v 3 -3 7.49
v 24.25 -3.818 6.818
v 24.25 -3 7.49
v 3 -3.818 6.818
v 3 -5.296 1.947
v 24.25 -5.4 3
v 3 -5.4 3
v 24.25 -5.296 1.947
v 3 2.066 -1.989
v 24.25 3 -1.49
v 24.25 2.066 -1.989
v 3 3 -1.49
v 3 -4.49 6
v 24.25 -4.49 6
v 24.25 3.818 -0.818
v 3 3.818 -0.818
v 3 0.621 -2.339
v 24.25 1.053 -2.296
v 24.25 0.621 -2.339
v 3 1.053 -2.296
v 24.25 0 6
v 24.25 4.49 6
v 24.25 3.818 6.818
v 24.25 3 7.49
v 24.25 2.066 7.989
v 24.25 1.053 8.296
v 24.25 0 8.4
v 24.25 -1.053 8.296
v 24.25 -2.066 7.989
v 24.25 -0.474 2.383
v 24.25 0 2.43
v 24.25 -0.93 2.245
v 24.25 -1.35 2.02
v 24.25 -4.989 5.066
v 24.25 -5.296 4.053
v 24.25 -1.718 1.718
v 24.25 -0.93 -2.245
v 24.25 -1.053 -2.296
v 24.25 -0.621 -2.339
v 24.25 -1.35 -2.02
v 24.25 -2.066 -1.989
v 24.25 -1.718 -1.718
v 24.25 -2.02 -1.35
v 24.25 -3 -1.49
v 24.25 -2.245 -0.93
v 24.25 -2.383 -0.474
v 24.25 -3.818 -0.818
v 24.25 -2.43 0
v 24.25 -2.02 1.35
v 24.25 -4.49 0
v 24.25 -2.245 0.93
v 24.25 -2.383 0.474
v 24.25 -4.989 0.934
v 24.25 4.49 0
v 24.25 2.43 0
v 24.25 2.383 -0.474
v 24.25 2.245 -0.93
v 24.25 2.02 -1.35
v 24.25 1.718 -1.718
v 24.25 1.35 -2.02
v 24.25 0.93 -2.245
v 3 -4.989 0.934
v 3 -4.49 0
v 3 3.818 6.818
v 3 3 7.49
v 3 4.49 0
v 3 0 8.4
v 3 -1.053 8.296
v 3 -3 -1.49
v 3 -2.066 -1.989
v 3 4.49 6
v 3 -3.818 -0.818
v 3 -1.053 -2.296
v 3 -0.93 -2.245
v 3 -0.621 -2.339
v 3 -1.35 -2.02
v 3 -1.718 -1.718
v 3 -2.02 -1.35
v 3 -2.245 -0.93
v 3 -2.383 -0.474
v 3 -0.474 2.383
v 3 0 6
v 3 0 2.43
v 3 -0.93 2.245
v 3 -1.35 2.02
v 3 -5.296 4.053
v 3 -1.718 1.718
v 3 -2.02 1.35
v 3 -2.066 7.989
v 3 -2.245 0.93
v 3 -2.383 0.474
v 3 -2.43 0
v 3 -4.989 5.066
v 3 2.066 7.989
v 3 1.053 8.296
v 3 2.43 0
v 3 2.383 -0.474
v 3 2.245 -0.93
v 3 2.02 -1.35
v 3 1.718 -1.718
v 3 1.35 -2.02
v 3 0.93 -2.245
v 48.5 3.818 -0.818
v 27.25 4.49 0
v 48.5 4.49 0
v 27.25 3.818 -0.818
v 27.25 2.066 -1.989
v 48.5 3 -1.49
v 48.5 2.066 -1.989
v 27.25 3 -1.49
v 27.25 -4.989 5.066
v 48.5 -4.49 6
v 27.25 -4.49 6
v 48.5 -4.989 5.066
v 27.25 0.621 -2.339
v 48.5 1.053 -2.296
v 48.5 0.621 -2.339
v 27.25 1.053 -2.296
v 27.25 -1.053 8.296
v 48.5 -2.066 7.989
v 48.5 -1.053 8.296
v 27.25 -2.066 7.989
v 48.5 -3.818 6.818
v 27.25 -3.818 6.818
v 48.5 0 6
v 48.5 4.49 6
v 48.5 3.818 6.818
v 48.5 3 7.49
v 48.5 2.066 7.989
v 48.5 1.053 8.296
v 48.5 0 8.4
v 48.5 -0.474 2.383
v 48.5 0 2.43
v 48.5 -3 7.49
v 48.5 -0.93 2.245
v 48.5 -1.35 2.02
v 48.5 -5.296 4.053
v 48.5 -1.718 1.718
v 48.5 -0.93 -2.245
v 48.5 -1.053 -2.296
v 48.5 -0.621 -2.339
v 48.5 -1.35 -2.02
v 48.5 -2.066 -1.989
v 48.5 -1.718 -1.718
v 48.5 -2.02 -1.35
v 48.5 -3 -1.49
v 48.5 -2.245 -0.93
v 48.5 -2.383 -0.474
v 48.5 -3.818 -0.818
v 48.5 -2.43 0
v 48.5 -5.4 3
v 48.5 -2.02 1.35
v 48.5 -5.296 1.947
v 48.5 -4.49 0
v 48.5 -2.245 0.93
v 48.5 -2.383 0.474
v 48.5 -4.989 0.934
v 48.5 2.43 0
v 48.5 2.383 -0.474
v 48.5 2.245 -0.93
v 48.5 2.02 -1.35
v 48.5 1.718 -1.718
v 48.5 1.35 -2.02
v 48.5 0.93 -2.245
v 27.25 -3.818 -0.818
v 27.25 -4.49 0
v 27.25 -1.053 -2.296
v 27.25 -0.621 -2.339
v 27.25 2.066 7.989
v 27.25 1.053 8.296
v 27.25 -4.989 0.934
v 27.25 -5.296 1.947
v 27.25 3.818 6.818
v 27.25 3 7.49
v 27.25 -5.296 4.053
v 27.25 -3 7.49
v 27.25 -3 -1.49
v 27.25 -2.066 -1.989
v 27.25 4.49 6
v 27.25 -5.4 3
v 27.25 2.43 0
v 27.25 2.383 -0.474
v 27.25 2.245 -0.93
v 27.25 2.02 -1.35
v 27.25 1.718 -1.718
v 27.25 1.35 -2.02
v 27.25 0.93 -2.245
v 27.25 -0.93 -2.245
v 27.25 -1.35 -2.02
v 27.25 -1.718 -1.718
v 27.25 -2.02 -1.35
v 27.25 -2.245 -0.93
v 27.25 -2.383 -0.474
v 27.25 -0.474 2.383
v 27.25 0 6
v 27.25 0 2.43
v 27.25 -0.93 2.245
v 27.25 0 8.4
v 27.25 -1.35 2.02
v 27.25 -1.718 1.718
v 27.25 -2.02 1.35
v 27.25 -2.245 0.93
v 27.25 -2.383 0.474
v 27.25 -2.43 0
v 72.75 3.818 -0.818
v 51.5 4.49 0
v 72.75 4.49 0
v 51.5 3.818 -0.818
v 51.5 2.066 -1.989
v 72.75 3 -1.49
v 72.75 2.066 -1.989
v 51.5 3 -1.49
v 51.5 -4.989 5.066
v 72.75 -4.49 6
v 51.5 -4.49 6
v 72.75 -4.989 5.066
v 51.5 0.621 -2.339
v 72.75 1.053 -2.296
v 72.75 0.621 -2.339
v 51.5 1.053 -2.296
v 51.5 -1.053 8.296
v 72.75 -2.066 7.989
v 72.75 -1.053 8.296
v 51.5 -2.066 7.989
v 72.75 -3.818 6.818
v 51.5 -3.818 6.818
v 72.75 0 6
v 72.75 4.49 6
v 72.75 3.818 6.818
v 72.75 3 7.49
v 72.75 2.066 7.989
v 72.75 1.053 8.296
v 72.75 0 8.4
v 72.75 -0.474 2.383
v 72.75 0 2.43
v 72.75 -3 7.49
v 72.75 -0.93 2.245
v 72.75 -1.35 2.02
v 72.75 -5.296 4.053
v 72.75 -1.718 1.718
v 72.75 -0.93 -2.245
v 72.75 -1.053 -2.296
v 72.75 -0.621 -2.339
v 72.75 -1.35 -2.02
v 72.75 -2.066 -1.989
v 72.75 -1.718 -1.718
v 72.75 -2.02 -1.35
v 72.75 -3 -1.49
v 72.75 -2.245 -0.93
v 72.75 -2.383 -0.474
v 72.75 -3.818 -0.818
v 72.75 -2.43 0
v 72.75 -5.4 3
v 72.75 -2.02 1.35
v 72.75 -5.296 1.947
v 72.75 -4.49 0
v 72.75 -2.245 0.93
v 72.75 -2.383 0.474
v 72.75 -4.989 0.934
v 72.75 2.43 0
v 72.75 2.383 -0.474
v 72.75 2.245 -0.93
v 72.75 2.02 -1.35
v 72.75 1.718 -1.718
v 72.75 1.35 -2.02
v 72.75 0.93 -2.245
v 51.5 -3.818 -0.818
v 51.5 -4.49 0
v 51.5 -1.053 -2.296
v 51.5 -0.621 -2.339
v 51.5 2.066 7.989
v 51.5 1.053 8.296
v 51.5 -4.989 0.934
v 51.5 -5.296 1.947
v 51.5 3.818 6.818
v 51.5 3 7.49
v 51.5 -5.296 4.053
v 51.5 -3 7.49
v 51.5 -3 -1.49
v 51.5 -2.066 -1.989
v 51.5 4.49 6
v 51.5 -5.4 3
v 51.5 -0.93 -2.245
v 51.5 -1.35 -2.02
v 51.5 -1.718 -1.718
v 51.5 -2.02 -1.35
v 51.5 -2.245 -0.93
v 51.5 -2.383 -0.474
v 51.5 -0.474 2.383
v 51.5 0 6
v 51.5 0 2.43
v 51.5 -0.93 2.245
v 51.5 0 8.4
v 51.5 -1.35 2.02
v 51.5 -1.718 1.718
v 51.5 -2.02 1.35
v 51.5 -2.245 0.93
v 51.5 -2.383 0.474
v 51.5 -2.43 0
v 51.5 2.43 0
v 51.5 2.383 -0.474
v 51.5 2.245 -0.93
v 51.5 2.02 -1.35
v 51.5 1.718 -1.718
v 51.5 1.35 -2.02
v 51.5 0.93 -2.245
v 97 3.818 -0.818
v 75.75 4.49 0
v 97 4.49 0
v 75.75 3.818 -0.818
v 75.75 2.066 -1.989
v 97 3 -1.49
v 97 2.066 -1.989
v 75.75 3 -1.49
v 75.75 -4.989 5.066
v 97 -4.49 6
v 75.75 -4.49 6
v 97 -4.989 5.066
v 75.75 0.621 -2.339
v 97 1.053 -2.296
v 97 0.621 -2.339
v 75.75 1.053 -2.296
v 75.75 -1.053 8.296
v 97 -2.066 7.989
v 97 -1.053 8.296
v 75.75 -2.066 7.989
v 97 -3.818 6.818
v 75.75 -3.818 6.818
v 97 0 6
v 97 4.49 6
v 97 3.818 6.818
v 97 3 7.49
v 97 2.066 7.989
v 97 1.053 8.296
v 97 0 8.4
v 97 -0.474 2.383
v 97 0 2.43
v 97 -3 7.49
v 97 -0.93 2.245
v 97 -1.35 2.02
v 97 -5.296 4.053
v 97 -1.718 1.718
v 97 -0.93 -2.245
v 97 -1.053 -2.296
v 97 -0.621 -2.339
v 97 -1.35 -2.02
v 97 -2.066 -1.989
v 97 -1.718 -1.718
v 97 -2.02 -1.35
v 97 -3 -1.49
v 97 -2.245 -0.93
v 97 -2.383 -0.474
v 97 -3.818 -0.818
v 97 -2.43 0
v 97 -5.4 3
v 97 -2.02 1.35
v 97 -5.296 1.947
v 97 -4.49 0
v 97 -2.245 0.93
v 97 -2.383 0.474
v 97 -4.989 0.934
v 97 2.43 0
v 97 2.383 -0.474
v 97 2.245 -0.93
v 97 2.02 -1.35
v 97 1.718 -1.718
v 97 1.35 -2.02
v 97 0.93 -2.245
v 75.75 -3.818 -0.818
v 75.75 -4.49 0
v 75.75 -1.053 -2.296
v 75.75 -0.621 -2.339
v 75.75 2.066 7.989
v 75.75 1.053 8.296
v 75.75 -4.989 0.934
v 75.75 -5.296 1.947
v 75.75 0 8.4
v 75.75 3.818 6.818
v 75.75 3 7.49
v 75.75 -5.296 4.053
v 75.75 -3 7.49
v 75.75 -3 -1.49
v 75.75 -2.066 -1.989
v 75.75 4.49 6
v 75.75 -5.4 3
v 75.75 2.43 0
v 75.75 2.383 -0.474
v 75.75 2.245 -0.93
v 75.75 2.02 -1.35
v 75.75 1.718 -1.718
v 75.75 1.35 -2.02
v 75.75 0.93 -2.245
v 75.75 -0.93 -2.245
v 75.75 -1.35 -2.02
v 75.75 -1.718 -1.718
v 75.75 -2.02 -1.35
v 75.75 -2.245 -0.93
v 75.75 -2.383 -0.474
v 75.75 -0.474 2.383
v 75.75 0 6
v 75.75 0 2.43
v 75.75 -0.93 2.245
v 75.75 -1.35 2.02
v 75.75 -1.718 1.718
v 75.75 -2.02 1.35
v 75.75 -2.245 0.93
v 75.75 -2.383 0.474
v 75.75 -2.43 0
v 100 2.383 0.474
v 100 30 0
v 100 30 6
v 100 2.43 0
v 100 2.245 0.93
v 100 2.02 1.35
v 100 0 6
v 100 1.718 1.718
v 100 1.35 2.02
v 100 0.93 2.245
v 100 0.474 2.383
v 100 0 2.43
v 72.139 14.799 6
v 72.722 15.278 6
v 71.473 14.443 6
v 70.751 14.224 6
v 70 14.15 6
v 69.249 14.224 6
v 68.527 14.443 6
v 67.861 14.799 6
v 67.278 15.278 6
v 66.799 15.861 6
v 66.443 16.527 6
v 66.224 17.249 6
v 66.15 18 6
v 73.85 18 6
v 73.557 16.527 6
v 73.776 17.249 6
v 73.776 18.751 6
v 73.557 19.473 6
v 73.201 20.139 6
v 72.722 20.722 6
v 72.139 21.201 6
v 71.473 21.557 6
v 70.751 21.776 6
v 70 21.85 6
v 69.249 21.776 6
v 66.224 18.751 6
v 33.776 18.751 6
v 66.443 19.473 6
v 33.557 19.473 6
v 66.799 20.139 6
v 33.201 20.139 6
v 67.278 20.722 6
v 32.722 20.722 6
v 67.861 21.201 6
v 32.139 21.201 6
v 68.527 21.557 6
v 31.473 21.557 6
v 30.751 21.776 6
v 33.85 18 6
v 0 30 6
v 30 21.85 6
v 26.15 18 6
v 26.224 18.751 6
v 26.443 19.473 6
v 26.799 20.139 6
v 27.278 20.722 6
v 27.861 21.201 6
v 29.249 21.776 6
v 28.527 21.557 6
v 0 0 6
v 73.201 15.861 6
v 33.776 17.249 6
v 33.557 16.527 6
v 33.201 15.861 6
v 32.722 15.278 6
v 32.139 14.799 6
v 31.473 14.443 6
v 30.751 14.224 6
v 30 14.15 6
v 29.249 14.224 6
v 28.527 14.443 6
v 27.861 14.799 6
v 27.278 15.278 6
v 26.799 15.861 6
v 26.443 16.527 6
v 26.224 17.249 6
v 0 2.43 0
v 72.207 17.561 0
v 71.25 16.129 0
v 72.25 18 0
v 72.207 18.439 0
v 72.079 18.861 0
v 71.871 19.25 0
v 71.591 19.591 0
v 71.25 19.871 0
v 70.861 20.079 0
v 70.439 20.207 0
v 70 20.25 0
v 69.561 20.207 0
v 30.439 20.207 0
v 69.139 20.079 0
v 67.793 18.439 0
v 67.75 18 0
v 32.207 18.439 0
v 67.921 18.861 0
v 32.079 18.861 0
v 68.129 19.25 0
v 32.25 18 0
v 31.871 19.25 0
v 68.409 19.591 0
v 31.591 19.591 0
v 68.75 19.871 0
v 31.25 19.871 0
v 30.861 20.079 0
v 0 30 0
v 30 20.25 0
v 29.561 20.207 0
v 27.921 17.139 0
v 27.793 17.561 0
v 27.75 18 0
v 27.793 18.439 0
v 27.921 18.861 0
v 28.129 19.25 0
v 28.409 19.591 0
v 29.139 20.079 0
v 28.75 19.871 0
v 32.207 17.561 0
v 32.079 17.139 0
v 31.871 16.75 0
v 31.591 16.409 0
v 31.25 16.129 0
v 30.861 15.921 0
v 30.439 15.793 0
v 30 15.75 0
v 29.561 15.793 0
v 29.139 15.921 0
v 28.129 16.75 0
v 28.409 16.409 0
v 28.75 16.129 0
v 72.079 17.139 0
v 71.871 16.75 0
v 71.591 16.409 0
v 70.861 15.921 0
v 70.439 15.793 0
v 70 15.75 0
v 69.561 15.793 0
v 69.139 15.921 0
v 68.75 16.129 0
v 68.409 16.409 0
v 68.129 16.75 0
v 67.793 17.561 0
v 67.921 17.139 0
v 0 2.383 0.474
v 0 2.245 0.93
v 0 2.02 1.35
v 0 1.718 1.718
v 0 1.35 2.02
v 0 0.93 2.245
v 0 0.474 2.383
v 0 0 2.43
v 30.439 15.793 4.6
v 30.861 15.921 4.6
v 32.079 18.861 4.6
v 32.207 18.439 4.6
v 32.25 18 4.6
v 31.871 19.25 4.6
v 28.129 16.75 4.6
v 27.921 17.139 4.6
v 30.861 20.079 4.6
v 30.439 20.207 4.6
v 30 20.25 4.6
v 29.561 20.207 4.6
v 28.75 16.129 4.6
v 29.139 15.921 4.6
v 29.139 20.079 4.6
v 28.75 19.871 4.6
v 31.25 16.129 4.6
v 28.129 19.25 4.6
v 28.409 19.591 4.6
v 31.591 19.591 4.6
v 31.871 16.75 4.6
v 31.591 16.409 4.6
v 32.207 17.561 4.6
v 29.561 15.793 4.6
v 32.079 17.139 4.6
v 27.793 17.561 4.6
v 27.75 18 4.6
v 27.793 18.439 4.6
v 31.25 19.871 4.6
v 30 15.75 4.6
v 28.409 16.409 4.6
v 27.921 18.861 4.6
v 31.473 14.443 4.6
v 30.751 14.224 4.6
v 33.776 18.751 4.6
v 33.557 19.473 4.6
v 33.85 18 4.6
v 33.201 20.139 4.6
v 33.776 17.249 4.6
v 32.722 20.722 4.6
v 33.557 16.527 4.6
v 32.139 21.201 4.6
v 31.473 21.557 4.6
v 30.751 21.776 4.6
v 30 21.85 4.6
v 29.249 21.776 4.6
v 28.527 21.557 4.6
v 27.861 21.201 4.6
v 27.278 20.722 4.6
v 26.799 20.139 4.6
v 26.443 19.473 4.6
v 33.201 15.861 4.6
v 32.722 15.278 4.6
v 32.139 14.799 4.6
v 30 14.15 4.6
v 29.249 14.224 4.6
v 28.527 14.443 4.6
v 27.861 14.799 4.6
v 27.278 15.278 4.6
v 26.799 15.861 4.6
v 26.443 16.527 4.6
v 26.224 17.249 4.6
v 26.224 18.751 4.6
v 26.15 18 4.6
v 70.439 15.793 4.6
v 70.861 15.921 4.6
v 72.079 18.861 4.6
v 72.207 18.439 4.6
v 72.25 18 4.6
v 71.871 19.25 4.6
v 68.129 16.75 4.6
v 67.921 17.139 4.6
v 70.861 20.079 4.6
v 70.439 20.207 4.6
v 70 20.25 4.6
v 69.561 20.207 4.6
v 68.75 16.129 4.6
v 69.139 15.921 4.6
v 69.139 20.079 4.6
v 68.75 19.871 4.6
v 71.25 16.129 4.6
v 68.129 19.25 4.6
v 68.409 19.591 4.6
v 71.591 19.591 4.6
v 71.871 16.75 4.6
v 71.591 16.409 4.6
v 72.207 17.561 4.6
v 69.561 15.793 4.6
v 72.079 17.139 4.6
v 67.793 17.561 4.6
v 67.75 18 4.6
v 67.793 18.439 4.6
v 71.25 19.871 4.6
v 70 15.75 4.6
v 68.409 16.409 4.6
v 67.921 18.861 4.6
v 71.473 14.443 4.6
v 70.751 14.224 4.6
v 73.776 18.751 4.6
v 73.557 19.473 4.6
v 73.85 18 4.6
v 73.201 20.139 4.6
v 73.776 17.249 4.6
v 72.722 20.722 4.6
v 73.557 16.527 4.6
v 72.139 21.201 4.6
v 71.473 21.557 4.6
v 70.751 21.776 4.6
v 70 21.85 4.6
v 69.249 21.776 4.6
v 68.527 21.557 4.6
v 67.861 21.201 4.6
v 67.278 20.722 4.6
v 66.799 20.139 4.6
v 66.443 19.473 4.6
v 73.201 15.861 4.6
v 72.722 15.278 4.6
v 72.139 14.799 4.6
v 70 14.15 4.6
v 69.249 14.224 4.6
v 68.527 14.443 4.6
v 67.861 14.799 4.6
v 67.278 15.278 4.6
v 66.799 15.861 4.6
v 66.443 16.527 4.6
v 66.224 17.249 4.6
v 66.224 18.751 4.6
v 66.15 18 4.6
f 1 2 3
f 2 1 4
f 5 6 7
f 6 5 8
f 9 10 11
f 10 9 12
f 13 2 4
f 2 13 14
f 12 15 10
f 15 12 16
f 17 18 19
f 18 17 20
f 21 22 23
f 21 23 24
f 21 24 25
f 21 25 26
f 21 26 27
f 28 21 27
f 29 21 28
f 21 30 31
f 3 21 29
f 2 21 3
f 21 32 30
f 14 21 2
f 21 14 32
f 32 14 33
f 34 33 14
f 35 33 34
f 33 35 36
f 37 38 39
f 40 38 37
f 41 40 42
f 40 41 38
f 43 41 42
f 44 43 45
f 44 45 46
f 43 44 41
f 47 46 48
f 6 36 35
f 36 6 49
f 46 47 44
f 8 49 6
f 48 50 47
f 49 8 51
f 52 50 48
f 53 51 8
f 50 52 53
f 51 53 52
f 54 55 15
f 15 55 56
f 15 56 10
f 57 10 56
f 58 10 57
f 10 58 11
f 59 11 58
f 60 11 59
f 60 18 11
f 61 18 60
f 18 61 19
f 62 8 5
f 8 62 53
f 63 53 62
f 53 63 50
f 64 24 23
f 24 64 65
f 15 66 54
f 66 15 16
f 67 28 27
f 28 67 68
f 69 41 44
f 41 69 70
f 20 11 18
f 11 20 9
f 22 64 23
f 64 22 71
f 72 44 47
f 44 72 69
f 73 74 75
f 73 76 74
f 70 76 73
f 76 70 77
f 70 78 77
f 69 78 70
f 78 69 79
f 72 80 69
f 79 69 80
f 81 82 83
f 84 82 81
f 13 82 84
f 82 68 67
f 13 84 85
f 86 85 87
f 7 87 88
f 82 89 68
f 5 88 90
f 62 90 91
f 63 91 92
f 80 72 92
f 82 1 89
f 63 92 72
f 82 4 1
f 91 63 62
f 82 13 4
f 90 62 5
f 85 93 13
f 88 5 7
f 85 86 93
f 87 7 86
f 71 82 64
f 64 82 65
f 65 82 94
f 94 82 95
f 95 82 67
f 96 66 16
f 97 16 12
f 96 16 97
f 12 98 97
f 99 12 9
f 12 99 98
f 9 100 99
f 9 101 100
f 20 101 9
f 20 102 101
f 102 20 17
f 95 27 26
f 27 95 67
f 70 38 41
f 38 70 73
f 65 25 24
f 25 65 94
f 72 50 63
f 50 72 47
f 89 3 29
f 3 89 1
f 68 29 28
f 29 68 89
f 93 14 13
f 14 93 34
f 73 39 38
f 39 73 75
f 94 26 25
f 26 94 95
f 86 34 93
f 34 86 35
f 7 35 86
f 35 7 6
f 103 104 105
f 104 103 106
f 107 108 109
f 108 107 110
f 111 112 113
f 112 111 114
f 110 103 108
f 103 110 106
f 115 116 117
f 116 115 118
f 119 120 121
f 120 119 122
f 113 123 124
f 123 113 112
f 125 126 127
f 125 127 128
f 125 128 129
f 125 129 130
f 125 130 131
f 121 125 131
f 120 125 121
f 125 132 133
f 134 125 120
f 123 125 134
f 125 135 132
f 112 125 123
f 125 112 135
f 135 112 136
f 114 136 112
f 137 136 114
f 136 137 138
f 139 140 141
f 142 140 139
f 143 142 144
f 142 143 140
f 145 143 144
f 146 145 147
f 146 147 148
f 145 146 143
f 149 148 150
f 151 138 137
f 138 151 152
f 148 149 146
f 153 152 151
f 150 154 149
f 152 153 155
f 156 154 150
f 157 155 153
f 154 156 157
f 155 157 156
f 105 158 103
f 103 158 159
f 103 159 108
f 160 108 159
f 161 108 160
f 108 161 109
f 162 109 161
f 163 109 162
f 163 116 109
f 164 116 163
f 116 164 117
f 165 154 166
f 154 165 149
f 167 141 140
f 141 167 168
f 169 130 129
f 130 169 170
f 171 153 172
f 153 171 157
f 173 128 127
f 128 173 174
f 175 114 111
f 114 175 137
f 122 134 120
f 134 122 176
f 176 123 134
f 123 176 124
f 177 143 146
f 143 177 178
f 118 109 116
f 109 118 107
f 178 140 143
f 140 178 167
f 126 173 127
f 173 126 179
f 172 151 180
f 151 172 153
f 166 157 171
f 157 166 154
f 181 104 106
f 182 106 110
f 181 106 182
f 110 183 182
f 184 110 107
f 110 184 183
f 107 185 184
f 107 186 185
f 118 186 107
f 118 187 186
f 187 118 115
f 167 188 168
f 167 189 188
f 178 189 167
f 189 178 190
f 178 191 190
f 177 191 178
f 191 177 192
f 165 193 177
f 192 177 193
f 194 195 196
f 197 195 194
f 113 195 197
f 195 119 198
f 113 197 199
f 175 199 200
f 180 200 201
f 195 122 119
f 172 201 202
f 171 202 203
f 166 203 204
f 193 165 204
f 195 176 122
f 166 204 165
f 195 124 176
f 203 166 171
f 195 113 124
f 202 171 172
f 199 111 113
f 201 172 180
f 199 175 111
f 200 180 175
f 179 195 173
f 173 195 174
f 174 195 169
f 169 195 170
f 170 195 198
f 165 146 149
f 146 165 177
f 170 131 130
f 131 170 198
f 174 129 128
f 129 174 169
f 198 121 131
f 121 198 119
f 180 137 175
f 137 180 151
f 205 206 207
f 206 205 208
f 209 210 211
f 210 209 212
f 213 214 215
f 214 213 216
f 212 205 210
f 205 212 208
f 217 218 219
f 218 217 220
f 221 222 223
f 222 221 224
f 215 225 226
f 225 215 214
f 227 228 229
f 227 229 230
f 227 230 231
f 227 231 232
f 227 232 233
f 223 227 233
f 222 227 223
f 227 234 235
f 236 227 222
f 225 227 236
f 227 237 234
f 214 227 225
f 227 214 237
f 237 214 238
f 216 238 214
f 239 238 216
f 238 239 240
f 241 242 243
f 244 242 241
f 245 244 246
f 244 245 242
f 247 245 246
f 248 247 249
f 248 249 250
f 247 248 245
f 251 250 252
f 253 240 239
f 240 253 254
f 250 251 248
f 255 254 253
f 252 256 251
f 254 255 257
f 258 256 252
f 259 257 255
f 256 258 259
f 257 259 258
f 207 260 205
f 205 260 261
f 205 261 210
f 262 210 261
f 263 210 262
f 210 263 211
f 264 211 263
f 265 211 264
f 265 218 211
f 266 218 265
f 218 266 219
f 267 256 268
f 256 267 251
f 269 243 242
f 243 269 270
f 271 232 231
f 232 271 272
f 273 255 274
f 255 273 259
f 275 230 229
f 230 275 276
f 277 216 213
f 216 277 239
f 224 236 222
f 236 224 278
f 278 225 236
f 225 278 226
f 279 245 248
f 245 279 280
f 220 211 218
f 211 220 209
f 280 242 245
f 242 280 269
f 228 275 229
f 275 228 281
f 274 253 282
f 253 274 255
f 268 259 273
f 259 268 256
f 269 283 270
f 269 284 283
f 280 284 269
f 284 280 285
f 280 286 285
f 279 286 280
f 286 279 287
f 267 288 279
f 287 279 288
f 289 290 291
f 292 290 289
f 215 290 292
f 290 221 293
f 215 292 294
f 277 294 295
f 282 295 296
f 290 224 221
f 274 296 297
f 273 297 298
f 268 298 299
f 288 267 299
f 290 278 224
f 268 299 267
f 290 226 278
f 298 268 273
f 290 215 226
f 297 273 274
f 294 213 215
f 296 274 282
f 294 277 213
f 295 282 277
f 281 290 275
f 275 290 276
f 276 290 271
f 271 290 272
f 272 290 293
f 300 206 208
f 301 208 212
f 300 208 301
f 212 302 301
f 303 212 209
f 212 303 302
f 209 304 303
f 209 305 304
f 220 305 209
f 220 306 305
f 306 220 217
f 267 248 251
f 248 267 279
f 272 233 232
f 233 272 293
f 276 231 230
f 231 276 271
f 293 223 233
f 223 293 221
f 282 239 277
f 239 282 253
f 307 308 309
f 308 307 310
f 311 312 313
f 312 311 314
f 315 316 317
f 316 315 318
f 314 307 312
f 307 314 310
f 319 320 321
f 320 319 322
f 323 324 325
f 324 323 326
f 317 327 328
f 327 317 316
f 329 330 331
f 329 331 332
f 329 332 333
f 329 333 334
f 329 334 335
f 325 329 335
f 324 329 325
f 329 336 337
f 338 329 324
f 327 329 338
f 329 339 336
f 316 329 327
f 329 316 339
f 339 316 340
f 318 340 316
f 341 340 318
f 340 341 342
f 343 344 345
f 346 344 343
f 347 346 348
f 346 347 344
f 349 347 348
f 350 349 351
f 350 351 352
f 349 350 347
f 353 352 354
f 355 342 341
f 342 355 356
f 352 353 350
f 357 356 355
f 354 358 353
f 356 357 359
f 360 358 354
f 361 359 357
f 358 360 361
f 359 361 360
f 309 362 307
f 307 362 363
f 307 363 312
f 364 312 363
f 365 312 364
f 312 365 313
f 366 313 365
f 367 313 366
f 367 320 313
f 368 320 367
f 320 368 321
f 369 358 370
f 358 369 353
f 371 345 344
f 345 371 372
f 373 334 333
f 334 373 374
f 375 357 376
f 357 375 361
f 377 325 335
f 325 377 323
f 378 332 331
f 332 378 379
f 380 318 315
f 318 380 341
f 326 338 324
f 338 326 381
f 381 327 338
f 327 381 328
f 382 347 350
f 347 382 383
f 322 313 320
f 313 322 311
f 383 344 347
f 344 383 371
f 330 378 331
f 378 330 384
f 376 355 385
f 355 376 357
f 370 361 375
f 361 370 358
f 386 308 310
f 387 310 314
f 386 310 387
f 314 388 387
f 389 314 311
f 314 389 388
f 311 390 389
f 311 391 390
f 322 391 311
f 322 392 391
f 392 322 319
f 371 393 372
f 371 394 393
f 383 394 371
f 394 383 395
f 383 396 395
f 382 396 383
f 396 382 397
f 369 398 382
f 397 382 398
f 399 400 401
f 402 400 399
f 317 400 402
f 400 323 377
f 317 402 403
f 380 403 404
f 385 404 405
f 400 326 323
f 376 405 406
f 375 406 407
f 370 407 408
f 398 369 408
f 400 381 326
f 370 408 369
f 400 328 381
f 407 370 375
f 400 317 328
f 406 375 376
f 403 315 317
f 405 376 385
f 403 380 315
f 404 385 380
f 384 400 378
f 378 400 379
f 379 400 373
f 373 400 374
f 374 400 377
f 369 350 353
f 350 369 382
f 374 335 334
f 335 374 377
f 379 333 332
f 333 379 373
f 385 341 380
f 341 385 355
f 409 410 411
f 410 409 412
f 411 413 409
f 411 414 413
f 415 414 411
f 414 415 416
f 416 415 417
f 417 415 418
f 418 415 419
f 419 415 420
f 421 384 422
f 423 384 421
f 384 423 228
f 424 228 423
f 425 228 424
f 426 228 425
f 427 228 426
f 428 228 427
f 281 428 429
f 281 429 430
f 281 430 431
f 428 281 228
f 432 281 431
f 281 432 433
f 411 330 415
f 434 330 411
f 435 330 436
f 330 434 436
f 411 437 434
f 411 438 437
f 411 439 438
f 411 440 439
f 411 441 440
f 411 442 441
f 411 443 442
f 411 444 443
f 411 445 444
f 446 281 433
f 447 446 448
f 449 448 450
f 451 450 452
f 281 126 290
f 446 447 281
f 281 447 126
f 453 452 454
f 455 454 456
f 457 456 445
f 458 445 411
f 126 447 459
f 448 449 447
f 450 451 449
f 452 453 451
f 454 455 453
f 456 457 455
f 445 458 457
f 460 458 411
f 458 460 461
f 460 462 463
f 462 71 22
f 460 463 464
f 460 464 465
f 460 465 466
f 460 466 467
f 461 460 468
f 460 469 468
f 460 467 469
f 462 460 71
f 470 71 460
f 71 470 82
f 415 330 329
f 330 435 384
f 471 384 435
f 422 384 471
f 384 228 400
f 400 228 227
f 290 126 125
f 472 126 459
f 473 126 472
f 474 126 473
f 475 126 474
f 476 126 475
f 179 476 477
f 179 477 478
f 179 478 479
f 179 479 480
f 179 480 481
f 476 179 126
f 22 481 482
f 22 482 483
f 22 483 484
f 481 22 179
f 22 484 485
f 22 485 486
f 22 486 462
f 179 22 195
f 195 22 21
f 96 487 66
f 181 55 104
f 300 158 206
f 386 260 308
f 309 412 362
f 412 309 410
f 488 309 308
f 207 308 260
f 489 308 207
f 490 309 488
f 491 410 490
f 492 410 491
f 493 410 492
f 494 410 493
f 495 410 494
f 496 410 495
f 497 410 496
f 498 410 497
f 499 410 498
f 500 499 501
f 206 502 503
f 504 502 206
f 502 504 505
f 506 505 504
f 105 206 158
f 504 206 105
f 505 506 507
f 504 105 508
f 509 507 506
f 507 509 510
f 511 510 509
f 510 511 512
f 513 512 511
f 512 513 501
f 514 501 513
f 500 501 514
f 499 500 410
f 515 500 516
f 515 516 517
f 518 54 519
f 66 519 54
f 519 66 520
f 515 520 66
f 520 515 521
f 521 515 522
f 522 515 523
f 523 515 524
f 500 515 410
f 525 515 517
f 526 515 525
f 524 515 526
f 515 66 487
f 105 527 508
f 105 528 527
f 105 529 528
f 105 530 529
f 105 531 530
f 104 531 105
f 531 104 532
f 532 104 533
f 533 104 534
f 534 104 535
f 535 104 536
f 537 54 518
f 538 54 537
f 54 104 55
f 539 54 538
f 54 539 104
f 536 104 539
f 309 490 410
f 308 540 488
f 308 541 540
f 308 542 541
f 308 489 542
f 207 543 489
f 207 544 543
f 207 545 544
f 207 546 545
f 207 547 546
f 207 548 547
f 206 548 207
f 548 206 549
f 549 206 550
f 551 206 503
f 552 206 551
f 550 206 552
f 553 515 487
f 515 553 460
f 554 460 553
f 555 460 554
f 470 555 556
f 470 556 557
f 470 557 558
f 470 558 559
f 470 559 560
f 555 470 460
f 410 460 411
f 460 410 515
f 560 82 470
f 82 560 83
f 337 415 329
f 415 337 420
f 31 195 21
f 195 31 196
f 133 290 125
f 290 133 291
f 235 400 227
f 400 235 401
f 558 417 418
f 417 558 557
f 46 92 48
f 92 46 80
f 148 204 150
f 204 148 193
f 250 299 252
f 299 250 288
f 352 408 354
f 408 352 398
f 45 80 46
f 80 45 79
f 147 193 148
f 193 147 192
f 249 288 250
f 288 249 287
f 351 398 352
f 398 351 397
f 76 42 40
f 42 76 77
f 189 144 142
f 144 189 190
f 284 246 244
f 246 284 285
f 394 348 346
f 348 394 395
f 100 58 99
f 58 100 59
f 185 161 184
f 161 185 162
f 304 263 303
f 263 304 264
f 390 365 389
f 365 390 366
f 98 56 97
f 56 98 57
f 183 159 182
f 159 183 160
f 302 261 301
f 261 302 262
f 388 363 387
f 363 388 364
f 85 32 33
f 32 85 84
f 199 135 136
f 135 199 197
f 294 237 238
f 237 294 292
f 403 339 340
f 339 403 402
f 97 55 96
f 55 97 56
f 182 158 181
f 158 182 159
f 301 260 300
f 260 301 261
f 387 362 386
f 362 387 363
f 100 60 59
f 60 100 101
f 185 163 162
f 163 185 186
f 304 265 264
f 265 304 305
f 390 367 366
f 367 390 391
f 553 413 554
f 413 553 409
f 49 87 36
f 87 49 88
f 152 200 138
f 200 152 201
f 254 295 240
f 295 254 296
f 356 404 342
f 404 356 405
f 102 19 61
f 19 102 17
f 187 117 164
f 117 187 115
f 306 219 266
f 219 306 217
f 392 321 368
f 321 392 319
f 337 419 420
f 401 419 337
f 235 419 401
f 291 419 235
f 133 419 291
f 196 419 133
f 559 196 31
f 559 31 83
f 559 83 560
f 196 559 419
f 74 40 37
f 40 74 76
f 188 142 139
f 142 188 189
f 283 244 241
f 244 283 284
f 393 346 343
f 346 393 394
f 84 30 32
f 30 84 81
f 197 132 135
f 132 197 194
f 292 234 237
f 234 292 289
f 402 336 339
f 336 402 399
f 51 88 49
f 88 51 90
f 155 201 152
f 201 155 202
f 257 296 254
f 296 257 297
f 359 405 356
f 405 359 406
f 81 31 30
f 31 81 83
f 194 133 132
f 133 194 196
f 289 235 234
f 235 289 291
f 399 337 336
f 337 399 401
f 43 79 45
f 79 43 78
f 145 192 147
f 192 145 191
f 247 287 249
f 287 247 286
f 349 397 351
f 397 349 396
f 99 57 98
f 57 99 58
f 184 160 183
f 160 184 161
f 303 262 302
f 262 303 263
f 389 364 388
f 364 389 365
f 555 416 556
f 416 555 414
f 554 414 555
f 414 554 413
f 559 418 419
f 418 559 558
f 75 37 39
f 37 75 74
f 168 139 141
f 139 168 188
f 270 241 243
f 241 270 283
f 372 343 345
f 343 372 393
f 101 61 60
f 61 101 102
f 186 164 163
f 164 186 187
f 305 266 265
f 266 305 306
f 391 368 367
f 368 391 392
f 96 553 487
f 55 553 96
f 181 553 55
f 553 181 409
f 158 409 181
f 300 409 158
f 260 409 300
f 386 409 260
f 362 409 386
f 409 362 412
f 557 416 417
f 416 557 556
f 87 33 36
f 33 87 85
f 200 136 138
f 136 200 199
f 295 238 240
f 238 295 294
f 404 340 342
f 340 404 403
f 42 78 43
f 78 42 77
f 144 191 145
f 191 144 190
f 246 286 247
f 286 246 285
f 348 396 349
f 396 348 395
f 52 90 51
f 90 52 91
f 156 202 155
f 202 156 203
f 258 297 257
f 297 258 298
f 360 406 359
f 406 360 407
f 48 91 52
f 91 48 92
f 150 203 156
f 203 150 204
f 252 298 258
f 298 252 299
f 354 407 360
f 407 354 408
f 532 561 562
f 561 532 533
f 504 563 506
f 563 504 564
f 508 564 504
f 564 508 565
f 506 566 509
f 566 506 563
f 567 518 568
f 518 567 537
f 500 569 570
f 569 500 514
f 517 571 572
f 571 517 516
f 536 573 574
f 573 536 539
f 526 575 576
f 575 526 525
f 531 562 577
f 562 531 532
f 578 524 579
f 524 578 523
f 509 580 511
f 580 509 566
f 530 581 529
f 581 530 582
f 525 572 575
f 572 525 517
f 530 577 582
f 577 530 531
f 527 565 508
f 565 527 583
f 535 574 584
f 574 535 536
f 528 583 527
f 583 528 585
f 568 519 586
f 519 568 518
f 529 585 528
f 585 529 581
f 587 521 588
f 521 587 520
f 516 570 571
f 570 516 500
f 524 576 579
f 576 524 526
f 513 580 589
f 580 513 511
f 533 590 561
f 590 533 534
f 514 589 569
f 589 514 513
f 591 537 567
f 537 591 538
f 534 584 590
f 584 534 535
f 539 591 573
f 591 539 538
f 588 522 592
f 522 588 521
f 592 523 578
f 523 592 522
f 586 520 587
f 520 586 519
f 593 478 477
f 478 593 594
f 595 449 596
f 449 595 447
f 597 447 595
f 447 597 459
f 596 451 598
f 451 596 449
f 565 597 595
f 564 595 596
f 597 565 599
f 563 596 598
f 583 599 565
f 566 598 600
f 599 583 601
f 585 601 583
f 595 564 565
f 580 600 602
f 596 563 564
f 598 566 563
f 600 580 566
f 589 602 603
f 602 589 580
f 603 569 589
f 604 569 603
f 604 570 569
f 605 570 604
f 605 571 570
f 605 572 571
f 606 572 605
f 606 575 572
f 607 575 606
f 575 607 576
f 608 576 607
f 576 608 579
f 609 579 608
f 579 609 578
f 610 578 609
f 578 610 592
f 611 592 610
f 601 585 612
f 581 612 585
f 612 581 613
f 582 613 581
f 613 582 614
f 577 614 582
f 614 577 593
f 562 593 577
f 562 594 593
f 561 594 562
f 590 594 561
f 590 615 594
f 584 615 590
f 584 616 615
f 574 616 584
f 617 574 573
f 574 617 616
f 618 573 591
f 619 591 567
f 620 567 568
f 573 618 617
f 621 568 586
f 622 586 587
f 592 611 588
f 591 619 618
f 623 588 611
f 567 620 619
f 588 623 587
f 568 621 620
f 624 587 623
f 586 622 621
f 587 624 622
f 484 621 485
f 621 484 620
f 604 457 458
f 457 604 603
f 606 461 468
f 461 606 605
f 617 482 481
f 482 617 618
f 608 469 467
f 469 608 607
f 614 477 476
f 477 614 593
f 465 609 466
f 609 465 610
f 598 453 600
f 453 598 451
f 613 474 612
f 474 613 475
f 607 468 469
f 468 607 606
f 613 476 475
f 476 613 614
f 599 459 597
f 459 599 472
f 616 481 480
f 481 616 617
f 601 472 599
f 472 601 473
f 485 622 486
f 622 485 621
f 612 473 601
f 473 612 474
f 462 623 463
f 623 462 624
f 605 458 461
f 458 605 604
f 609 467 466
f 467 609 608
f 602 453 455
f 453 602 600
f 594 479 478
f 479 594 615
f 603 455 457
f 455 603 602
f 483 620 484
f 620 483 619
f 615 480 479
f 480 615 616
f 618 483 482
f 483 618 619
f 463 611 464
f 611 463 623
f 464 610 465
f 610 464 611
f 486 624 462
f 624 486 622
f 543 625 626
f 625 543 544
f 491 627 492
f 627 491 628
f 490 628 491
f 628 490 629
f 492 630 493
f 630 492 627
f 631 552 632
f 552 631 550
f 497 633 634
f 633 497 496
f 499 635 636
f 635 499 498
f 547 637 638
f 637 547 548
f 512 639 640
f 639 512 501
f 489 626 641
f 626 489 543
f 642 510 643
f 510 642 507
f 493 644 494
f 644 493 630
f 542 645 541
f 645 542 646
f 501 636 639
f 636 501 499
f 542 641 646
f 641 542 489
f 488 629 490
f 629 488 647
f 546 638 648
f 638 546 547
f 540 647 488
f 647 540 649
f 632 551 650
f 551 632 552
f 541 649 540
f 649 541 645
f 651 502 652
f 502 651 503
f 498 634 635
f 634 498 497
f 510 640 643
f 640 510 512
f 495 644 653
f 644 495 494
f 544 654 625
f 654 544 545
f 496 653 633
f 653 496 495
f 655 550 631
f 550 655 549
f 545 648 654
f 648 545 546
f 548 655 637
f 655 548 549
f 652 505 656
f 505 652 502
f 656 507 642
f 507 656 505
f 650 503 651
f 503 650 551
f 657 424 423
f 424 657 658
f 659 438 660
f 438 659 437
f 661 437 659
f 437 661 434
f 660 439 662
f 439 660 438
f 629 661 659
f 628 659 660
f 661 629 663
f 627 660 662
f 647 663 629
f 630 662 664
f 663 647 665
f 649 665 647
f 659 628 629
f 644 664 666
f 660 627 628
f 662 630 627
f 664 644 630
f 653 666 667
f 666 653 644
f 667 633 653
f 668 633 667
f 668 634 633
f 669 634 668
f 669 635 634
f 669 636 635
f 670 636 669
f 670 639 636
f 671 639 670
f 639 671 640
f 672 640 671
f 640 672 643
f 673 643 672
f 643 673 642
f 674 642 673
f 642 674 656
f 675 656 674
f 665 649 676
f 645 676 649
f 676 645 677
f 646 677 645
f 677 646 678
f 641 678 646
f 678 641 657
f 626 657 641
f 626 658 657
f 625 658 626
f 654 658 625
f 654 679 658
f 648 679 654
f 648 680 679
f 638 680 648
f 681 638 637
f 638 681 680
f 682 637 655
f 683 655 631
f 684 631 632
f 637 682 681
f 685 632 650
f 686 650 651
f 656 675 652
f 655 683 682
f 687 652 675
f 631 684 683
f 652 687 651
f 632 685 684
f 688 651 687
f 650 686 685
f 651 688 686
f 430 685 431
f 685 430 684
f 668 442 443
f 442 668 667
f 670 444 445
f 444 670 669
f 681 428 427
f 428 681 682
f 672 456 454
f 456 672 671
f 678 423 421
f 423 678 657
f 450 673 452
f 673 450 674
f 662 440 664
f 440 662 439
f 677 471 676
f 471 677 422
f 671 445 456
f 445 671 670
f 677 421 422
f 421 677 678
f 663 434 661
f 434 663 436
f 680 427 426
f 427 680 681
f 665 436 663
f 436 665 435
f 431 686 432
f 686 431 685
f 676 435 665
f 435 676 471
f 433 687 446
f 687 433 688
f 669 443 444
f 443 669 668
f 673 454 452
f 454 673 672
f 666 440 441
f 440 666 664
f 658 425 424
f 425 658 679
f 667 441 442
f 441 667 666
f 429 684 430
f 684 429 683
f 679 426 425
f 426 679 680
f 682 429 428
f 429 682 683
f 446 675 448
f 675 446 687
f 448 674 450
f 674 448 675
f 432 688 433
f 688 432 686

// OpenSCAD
$fn = 32;

// ----------------------------------------------------------------------
// Hinge leaf: 100 x 35.4 x 10.8 mm
// ----------------------------------------------------------------------

// --- parameters (mm) ---
plate_len = 100;          // leaf length, X
plate_w = 30;             // leaf width, Y
plate_t = 6;              // leaf thickness
barrel_d = 10.8;          // knuckle diameter
barrel_w = 21.25;         // knuckle width
knuckle_n = 4;            // number of knuckles
pin_d = 4.86;             // pin bore
gap = 3;                  // gap between the knuckles
screw_d = 4.5;            // screw clearance
cs_d = 7.7;               // countersink diameter
cs_h = 1.4;               // countersink depth

module leaf() {
  cube([plate_len, plate_w, plate_t]);
}

module knuckles() {
  /* barrels sit on the leaf edge, the pin axis at half the leaf thickness */
  for (i = [0 : knuckle_n - 1])
    translate([gap + i * (barrel_w + gap), 0, plate_t * 0.5])
      rotate([0, 90, 0]) cylinder(h = barrel_w, d = barrel_d);
}

difference() {
  union() {
    leaf();
    knuckles();
  }
  rotate([0, 90, 0]) translate([0, 0, -1])
    cylinder(h = plate_len + 2, d = pin_d);
  translate([30, plate_w * 0.6, -1]) cylinder(h = plate_t + 2, d = screw_d);
  translate([30, plate_w * 0.6, plate_t - cs_h]) cylinder(h = cs_h + 0.5, d = cs_d);
  translate([70, plate_w * 0.6, -1]) cylinder(h = plate_t + 2, d = screw_d);
  translate([70, plate_w * 0.6, plate_t - cs_h]) cylinder(h = cs_h + 0.5, d = cs_d);
}
